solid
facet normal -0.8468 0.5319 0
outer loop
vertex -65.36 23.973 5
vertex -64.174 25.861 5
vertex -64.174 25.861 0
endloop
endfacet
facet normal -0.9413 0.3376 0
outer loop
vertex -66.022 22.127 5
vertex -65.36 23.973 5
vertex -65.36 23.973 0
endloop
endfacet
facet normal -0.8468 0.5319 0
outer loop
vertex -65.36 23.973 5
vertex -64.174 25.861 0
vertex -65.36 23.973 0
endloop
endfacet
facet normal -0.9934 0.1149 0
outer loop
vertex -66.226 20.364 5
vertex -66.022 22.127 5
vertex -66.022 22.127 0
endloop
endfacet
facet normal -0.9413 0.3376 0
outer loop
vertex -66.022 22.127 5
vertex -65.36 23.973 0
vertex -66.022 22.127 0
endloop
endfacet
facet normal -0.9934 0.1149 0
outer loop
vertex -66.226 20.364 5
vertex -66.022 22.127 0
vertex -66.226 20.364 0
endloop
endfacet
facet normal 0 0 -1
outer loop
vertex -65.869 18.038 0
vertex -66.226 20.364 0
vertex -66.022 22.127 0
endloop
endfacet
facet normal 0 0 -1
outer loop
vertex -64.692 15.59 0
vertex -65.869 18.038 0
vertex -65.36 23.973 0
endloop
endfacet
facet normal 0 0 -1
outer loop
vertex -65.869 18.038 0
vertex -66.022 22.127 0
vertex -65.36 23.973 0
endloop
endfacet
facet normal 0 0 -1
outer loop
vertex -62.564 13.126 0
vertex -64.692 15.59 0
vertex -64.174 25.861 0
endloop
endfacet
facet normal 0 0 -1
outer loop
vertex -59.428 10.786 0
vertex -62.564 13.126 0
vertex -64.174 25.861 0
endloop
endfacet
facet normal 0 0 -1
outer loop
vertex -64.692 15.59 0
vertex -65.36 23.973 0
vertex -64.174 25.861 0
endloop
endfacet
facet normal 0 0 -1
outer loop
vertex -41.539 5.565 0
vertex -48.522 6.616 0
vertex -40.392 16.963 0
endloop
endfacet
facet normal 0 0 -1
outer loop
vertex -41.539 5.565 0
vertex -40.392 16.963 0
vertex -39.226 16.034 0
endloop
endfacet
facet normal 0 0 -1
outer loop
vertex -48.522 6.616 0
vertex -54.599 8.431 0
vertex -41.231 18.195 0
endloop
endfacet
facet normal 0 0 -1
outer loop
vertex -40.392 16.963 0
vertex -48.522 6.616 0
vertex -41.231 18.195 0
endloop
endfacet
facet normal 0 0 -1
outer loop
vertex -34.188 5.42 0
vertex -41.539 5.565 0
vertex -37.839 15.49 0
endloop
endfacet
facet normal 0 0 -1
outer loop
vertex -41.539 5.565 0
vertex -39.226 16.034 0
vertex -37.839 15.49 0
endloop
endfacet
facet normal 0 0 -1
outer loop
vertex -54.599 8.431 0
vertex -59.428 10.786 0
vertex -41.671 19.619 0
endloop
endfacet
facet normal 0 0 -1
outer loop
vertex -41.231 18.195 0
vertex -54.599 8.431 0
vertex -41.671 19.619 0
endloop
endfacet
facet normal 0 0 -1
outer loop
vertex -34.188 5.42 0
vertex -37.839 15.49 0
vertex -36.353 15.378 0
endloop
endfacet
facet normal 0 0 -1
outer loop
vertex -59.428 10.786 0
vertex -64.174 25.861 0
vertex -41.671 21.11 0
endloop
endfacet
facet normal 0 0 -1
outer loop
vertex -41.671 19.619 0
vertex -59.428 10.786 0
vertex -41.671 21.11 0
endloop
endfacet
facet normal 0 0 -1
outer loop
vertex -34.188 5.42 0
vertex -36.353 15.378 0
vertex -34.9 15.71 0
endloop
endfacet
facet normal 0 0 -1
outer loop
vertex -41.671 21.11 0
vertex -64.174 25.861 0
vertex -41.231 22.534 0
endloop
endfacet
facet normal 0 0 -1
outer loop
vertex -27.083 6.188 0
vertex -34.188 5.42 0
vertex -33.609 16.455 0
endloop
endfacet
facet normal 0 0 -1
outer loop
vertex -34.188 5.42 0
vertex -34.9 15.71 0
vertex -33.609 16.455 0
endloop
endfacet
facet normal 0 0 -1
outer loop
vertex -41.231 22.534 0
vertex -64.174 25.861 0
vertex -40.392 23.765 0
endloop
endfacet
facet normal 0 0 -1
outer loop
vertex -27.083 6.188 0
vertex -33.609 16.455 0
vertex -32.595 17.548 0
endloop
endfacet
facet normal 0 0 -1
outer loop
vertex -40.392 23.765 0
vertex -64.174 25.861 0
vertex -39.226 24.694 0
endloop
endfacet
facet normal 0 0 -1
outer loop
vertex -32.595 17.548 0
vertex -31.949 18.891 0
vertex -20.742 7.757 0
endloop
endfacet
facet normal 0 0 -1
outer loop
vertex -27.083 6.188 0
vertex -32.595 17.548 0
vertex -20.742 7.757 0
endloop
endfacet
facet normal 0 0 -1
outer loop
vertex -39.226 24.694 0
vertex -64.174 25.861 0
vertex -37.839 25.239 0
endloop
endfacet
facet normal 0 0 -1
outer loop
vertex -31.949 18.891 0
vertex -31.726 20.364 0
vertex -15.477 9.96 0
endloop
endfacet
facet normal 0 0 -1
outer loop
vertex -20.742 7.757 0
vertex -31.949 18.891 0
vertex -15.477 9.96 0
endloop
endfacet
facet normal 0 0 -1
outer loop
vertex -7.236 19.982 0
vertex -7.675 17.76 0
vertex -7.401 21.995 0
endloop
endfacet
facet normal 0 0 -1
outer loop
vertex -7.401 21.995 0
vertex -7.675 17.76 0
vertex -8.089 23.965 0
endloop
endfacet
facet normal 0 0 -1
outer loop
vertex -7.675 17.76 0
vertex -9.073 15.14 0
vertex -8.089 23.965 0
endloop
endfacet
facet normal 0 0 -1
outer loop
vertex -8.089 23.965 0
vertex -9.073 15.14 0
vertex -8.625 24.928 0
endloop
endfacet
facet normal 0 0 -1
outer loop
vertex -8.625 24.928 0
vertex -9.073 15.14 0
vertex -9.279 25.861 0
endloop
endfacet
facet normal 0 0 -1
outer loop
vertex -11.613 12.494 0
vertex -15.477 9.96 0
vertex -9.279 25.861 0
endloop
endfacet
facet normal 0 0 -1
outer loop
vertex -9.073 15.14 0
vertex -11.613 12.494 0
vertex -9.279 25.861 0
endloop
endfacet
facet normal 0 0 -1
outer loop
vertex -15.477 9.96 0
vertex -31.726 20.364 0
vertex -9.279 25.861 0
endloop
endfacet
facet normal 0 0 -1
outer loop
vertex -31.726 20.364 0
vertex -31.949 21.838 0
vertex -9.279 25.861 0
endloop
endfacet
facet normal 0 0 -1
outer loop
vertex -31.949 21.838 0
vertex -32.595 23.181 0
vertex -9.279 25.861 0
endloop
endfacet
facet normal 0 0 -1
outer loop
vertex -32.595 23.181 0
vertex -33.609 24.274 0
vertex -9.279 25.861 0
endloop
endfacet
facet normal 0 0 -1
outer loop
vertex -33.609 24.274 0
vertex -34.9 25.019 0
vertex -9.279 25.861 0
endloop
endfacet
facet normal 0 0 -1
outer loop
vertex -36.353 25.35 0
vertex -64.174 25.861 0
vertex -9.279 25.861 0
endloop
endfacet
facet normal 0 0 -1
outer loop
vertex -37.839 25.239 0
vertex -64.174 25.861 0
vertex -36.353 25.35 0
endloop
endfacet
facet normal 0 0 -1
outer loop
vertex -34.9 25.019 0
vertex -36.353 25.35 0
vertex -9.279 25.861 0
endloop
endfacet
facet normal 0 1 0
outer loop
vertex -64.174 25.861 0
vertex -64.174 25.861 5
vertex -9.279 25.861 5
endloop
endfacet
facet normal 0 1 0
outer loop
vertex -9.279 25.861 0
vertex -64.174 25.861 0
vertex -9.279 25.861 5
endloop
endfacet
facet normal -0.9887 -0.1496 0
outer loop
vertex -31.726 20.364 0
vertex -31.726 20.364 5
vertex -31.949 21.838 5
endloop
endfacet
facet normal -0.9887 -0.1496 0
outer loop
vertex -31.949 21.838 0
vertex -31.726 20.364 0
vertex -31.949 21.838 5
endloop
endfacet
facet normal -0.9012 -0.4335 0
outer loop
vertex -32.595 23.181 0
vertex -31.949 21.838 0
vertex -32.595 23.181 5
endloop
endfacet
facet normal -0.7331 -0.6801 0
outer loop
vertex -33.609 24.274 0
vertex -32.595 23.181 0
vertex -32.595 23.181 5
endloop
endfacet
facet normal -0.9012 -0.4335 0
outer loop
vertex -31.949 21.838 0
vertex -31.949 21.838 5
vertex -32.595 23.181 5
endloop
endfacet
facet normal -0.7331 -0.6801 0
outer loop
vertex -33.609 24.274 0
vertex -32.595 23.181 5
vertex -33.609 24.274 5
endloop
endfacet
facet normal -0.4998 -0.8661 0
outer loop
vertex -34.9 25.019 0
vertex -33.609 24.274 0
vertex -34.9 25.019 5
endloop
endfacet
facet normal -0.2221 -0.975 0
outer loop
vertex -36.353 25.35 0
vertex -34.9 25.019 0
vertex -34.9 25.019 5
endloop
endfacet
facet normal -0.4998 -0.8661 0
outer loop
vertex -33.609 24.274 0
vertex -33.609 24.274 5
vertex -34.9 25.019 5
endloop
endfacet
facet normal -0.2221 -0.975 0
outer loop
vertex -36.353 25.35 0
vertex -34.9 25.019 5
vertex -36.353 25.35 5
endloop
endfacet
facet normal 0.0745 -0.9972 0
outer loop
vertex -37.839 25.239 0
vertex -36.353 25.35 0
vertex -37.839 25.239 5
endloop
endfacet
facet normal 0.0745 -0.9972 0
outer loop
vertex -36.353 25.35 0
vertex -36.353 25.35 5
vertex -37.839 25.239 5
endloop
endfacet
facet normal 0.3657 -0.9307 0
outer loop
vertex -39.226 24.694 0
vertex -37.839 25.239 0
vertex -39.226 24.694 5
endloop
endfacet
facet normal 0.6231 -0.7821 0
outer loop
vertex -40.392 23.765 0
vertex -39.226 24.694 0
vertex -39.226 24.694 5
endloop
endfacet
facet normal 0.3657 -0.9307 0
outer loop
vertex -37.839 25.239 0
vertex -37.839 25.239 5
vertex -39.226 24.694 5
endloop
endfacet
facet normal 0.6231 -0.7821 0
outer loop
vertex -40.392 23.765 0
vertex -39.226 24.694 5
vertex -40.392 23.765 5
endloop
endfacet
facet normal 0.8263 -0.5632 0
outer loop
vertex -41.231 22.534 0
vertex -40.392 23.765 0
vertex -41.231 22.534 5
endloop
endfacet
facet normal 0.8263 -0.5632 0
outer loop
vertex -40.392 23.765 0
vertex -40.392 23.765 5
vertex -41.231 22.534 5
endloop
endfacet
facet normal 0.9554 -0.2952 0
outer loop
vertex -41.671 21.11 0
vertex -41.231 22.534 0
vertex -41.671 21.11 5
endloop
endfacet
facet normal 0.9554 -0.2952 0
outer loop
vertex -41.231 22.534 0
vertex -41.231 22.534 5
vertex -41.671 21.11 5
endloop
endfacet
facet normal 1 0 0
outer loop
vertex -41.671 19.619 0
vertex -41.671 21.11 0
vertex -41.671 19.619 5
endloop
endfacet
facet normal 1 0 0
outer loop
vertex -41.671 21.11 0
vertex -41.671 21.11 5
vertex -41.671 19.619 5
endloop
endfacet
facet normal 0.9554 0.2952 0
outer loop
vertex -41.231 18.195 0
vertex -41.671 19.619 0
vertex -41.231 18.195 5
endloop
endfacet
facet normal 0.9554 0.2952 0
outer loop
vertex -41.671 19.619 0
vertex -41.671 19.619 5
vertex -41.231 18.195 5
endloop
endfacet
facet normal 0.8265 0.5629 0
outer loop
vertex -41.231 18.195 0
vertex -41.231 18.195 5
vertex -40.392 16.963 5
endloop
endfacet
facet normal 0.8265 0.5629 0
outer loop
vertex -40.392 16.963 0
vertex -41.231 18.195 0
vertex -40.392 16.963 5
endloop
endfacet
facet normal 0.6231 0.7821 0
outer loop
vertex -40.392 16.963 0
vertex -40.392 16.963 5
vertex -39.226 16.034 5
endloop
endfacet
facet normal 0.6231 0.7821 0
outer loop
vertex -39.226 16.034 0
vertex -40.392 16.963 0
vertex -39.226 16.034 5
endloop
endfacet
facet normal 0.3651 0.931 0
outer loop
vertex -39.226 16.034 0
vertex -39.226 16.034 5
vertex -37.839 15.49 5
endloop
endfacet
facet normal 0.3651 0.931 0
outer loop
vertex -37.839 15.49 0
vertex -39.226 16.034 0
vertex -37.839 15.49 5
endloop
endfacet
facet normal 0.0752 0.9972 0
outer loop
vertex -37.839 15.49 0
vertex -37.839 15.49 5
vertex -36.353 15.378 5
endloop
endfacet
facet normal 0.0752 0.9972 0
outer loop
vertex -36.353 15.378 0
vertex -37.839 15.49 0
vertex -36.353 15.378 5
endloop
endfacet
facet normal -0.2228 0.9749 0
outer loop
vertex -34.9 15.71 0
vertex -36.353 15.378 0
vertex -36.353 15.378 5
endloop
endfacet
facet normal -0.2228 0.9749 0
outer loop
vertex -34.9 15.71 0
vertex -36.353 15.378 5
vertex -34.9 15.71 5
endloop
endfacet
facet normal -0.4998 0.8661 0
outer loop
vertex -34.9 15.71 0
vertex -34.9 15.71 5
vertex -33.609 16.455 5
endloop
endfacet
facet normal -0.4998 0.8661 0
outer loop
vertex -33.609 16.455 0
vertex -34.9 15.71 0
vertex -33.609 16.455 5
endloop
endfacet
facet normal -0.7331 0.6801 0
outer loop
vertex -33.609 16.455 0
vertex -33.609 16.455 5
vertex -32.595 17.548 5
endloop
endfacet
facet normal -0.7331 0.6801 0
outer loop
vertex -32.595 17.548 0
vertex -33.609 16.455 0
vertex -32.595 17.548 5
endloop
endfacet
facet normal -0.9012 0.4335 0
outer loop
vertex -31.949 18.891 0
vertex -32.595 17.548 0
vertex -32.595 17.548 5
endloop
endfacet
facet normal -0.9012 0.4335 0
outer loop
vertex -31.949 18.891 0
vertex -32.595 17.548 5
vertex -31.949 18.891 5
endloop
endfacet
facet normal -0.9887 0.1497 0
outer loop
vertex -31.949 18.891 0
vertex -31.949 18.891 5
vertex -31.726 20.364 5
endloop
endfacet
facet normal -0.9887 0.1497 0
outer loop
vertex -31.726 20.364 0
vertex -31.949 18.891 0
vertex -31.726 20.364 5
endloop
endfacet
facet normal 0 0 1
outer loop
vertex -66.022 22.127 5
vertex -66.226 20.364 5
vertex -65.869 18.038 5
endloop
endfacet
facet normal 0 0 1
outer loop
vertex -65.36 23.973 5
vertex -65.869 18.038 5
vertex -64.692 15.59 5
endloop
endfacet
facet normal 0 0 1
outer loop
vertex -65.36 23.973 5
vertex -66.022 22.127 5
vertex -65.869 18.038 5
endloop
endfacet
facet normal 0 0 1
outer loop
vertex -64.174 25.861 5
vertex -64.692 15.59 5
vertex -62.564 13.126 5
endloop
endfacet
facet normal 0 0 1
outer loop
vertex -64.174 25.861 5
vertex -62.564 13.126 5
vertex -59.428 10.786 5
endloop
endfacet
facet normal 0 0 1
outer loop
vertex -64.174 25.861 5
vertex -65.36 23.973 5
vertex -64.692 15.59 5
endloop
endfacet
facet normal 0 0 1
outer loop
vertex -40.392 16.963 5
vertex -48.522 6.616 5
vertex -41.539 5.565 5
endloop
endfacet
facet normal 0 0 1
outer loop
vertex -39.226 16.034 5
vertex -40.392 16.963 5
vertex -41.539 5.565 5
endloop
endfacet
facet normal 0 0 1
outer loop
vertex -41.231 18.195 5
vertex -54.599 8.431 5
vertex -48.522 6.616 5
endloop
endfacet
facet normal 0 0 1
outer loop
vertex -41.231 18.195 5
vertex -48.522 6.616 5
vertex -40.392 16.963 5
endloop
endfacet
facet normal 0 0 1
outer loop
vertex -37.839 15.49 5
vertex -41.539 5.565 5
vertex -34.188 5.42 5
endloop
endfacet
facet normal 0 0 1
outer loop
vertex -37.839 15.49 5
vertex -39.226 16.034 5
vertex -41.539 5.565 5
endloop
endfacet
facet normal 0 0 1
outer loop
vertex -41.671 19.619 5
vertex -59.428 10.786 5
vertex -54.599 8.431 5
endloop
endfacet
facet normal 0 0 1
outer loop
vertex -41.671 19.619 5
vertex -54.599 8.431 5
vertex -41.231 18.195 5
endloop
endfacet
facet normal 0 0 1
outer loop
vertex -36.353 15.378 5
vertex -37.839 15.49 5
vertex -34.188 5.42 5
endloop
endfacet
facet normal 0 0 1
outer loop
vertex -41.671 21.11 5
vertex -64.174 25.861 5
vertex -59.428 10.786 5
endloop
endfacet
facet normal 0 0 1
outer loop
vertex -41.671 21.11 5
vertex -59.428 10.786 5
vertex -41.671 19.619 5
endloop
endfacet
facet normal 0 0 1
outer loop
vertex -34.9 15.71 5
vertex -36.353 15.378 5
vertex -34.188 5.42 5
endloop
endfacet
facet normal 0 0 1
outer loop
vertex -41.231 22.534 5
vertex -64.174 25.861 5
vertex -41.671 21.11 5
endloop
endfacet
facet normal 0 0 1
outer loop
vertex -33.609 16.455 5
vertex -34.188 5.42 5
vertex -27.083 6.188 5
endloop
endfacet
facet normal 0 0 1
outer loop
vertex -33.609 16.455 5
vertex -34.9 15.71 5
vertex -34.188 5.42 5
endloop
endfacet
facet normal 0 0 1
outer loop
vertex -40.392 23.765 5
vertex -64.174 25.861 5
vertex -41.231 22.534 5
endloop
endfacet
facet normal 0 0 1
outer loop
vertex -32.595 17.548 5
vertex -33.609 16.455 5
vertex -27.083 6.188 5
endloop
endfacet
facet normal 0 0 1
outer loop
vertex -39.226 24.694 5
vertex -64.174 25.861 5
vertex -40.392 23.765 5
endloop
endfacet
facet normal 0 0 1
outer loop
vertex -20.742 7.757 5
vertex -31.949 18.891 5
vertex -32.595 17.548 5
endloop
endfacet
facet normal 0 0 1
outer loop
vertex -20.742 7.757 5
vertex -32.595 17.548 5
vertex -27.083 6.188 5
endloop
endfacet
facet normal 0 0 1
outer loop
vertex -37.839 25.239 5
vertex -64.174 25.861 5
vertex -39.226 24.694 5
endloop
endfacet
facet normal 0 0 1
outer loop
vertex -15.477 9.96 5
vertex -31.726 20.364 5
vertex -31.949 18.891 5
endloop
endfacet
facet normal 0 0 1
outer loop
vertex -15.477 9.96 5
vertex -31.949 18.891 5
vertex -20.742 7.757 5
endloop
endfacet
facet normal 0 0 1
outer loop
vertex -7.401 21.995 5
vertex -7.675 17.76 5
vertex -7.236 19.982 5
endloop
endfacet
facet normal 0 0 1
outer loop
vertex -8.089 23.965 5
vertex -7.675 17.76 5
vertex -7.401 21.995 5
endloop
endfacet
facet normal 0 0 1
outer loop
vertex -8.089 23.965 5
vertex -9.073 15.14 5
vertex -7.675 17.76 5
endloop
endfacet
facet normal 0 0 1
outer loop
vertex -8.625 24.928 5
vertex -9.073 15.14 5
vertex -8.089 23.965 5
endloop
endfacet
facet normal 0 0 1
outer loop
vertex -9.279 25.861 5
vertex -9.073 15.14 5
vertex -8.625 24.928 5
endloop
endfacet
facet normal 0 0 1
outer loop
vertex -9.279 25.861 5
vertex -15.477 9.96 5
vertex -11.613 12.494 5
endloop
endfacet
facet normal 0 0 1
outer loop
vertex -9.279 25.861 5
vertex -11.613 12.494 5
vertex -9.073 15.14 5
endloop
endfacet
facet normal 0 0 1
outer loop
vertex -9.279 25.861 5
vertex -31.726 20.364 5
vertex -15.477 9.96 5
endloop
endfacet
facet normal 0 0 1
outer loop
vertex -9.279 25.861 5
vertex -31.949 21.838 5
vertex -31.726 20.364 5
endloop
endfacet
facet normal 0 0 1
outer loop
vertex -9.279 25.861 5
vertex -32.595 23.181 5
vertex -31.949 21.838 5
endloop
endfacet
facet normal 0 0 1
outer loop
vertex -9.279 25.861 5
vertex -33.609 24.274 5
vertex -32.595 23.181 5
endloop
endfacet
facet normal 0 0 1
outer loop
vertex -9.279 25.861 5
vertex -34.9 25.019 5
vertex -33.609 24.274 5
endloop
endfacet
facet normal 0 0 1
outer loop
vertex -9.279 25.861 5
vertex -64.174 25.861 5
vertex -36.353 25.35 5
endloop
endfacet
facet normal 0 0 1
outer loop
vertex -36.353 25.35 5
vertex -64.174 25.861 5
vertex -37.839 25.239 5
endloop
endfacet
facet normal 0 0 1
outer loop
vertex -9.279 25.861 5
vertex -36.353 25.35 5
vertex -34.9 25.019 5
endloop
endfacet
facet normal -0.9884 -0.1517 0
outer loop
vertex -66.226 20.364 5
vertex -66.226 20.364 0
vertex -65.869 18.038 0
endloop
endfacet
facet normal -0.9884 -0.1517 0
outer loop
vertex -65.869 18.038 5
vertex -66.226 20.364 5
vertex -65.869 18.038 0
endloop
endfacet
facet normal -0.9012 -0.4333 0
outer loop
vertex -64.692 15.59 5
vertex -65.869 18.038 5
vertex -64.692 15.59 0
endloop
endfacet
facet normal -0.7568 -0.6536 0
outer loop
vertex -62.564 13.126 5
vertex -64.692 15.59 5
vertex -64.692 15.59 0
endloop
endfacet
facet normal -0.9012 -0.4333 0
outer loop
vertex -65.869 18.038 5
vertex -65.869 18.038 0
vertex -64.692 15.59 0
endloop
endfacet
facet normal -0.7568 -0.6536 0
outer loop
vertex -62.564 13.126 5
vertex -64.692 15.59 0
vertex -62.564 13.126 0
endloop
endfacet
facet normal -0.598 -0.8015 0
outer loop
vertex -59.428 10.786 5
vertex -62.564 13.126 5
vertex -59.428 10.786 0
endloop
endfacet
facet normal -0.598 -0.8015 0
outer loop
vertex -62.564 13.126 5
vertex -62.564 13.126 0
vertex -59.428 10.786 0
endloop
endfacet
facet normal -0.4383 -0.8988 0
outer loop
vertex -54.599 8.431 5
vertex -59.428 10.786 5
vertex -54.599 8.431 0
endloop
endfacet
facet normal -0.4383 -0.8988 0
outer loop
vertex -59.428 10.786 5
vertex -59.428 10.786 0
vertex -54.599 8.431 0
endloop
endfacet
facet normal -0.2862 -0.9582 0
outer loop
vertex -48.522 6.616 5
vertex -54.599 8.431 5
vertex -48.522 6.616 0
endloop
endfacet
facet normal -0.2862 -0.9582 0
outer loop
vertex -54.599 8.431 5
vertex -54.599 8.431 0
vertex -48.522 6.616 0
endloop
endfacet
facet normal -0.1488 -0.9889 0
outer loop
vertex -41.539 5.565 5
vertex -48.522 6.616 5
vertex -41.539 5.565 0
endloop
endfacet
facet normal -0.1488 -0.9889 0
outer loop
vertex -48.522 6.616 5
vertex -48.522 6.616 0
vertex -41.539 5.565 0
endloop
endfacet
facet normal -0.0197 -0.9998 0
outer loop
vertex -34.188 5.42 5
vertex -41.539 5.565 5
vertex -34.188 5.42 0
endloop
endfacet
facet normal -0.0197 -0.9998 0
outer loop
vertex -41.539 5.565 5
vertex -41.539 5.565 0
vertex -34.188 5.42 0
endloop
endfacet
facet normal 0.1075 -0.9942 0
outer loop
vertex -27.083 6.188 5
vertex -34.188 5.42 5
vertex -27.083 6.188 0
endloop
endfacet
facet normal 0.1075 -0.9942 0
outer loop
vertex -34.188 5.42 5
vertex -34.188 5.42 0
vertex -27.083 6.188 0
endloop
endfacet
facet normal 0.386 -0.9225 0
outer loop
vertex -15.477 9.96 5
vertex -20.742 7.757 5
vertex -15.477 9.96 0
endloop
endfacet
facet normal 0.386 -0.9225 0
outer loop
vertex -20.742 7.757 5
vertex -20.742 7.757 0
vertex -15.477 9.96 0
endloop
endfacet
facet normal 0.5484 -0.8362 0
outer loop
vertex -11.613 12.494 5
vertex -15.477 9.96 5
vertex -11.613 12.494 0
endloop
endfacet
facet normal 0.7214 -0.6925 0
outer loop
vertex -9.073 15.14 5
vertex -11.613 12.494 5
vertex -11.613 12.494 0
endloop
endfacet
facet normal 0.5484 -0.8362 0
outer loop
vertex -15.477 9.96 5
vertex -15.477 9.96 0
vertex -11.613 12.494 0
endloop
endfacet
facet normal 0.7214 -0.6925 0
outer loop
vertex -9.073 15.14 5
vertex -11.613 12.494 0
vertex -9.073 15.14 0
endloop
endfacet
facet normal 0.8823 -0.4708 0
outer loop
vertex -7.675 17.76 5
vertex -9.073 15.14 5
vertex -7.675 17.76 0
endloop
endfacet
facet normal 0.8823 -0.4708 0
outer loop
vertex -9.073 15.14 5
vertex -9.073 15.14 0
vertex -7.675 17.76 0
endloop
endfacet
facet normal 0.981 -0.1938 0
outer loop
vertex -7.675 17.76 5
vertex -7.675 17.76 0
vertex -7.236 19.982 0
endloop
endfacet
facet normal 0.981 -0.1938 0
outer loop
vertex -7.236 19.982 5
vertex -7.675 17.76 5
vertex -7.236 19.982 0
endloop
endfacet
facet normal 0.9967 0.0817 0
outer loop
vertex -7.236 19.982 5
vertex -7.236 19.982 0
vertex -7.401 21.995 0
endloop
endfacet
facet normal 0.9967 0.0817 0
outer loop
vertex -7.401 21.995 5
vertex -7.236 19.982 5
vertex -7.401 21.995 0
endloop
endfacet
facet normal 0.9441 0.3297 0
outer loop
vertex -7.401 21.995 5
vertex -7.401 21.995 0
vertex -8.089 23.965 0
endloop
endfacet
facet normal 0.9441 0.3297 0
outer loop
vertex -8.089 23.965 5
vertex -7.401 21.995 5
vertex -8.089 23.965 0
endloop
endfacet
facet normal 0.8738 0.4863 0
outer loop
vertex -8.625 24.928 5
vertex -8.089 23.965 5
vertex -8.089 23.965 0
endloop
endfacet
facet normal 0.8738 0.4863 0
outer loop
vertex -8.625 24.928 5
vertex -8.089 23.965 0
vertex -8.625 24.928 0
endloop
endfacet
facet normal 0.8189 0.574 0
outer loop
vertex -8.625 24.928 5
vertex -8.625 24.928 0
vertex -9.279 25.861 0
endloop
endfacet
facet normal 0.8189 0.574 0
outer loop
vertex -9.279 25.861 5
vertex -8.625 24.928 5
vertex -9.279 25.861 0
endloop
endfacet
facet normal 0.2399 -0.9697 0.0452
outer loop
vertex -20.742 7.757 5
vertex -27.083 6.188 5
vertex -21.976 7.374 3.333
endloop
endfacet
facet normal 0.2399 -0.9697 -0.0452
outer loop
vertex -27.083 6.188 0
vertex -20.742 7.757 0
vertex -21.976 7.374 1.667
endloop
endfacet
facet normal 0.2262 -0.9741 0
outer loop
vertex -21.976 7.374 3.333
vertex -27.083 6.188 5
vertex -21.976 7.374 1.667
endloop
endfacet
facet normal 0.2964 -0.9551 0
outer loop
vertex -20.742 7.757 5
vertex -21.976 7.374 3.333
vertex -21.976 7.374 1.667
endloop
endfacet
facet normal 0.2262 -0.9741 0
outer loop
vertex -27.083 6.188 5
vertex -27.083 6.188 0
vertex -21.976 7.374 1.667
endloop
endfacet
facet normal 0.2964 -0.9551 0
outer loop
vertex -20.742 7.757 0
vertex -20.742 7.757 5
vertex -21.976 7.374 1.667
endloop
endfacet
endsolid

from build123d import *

# Parameters (mm, degrees)
F1_DEPTH = 5
F2_R     = 5
F3_DEPTH = 25
F5_DEPTH = 25


# Not quite as in the source:
# - a feature names something its author has since deleted; it is built from what else it names


with BuildPart() as f1:
    # F0 (on Top) → F1 (new body)
    with BuildSketch(Plane.XY):
        with BuildLine():
            add(Edge.make_bspline(
                [(-66.2264598608, 20.3643515706), (-66.2264598608, -5.6164105429), (-21.9764598608, 7.3739705138), (22.2735401392, 20.3643515706), (-21.9764598608, 33.3547326274), (-66.2264598608, 46.3451136841), (-66.2264598608, 20.3643515706)],
                knots=[0, 0, 0, 2.0943951024, 2.0943951024, 4.1887902048, 4.1887902048, 6.2831853072, 6.2831853072, 6.2831853072], degree=2, weights=[1, 0.5, 1, 0.5, 1, 0.5, 1]))
        make_face()
    extrude(amount=F1_DEPTH)

    # F2 (on face) → F3 (cut)
    with BuildSketch(Plane.XY.offset(5)):
        with Locations((-36.7264598608, 20.3643515706)):
            Circle(F2_R)
    extrude(amount=-F3_DEPTH, mode=Mode.SUBTRACT)

    # F4 (on face) → F5 (cut)
    with BuildSketch(Plane.XY.offset(5)):
        with BuildLine():
            add(Edge.make_bspline(
                [(-9.2786523325, 25.8612383577), (-13.0541377648, 30.7354249678), (-21.9764598608, 33.3547326274), (-51.6274393448, 42.0593094003), (-64.1742673891, 25.8612383577)],
                knots=[3.4859107004, 3.4859107004, 3.4859107004, 4.1887902048, 4.1887902048, 5.8694408983, 5.8694408983, 5.8694408983], degree=2, weights=[0.7770272803, 0.8321998787, 1, 0.5987742018, 0.8414769682]))
            Line((-64.1742673891, 25.8612383577), (-9.2786523325, 25.8612383577))
        make_face()
    extrude(amount=-F5_DEPTH, mode=Mode.SUBTRACT)


solid = f1.part
